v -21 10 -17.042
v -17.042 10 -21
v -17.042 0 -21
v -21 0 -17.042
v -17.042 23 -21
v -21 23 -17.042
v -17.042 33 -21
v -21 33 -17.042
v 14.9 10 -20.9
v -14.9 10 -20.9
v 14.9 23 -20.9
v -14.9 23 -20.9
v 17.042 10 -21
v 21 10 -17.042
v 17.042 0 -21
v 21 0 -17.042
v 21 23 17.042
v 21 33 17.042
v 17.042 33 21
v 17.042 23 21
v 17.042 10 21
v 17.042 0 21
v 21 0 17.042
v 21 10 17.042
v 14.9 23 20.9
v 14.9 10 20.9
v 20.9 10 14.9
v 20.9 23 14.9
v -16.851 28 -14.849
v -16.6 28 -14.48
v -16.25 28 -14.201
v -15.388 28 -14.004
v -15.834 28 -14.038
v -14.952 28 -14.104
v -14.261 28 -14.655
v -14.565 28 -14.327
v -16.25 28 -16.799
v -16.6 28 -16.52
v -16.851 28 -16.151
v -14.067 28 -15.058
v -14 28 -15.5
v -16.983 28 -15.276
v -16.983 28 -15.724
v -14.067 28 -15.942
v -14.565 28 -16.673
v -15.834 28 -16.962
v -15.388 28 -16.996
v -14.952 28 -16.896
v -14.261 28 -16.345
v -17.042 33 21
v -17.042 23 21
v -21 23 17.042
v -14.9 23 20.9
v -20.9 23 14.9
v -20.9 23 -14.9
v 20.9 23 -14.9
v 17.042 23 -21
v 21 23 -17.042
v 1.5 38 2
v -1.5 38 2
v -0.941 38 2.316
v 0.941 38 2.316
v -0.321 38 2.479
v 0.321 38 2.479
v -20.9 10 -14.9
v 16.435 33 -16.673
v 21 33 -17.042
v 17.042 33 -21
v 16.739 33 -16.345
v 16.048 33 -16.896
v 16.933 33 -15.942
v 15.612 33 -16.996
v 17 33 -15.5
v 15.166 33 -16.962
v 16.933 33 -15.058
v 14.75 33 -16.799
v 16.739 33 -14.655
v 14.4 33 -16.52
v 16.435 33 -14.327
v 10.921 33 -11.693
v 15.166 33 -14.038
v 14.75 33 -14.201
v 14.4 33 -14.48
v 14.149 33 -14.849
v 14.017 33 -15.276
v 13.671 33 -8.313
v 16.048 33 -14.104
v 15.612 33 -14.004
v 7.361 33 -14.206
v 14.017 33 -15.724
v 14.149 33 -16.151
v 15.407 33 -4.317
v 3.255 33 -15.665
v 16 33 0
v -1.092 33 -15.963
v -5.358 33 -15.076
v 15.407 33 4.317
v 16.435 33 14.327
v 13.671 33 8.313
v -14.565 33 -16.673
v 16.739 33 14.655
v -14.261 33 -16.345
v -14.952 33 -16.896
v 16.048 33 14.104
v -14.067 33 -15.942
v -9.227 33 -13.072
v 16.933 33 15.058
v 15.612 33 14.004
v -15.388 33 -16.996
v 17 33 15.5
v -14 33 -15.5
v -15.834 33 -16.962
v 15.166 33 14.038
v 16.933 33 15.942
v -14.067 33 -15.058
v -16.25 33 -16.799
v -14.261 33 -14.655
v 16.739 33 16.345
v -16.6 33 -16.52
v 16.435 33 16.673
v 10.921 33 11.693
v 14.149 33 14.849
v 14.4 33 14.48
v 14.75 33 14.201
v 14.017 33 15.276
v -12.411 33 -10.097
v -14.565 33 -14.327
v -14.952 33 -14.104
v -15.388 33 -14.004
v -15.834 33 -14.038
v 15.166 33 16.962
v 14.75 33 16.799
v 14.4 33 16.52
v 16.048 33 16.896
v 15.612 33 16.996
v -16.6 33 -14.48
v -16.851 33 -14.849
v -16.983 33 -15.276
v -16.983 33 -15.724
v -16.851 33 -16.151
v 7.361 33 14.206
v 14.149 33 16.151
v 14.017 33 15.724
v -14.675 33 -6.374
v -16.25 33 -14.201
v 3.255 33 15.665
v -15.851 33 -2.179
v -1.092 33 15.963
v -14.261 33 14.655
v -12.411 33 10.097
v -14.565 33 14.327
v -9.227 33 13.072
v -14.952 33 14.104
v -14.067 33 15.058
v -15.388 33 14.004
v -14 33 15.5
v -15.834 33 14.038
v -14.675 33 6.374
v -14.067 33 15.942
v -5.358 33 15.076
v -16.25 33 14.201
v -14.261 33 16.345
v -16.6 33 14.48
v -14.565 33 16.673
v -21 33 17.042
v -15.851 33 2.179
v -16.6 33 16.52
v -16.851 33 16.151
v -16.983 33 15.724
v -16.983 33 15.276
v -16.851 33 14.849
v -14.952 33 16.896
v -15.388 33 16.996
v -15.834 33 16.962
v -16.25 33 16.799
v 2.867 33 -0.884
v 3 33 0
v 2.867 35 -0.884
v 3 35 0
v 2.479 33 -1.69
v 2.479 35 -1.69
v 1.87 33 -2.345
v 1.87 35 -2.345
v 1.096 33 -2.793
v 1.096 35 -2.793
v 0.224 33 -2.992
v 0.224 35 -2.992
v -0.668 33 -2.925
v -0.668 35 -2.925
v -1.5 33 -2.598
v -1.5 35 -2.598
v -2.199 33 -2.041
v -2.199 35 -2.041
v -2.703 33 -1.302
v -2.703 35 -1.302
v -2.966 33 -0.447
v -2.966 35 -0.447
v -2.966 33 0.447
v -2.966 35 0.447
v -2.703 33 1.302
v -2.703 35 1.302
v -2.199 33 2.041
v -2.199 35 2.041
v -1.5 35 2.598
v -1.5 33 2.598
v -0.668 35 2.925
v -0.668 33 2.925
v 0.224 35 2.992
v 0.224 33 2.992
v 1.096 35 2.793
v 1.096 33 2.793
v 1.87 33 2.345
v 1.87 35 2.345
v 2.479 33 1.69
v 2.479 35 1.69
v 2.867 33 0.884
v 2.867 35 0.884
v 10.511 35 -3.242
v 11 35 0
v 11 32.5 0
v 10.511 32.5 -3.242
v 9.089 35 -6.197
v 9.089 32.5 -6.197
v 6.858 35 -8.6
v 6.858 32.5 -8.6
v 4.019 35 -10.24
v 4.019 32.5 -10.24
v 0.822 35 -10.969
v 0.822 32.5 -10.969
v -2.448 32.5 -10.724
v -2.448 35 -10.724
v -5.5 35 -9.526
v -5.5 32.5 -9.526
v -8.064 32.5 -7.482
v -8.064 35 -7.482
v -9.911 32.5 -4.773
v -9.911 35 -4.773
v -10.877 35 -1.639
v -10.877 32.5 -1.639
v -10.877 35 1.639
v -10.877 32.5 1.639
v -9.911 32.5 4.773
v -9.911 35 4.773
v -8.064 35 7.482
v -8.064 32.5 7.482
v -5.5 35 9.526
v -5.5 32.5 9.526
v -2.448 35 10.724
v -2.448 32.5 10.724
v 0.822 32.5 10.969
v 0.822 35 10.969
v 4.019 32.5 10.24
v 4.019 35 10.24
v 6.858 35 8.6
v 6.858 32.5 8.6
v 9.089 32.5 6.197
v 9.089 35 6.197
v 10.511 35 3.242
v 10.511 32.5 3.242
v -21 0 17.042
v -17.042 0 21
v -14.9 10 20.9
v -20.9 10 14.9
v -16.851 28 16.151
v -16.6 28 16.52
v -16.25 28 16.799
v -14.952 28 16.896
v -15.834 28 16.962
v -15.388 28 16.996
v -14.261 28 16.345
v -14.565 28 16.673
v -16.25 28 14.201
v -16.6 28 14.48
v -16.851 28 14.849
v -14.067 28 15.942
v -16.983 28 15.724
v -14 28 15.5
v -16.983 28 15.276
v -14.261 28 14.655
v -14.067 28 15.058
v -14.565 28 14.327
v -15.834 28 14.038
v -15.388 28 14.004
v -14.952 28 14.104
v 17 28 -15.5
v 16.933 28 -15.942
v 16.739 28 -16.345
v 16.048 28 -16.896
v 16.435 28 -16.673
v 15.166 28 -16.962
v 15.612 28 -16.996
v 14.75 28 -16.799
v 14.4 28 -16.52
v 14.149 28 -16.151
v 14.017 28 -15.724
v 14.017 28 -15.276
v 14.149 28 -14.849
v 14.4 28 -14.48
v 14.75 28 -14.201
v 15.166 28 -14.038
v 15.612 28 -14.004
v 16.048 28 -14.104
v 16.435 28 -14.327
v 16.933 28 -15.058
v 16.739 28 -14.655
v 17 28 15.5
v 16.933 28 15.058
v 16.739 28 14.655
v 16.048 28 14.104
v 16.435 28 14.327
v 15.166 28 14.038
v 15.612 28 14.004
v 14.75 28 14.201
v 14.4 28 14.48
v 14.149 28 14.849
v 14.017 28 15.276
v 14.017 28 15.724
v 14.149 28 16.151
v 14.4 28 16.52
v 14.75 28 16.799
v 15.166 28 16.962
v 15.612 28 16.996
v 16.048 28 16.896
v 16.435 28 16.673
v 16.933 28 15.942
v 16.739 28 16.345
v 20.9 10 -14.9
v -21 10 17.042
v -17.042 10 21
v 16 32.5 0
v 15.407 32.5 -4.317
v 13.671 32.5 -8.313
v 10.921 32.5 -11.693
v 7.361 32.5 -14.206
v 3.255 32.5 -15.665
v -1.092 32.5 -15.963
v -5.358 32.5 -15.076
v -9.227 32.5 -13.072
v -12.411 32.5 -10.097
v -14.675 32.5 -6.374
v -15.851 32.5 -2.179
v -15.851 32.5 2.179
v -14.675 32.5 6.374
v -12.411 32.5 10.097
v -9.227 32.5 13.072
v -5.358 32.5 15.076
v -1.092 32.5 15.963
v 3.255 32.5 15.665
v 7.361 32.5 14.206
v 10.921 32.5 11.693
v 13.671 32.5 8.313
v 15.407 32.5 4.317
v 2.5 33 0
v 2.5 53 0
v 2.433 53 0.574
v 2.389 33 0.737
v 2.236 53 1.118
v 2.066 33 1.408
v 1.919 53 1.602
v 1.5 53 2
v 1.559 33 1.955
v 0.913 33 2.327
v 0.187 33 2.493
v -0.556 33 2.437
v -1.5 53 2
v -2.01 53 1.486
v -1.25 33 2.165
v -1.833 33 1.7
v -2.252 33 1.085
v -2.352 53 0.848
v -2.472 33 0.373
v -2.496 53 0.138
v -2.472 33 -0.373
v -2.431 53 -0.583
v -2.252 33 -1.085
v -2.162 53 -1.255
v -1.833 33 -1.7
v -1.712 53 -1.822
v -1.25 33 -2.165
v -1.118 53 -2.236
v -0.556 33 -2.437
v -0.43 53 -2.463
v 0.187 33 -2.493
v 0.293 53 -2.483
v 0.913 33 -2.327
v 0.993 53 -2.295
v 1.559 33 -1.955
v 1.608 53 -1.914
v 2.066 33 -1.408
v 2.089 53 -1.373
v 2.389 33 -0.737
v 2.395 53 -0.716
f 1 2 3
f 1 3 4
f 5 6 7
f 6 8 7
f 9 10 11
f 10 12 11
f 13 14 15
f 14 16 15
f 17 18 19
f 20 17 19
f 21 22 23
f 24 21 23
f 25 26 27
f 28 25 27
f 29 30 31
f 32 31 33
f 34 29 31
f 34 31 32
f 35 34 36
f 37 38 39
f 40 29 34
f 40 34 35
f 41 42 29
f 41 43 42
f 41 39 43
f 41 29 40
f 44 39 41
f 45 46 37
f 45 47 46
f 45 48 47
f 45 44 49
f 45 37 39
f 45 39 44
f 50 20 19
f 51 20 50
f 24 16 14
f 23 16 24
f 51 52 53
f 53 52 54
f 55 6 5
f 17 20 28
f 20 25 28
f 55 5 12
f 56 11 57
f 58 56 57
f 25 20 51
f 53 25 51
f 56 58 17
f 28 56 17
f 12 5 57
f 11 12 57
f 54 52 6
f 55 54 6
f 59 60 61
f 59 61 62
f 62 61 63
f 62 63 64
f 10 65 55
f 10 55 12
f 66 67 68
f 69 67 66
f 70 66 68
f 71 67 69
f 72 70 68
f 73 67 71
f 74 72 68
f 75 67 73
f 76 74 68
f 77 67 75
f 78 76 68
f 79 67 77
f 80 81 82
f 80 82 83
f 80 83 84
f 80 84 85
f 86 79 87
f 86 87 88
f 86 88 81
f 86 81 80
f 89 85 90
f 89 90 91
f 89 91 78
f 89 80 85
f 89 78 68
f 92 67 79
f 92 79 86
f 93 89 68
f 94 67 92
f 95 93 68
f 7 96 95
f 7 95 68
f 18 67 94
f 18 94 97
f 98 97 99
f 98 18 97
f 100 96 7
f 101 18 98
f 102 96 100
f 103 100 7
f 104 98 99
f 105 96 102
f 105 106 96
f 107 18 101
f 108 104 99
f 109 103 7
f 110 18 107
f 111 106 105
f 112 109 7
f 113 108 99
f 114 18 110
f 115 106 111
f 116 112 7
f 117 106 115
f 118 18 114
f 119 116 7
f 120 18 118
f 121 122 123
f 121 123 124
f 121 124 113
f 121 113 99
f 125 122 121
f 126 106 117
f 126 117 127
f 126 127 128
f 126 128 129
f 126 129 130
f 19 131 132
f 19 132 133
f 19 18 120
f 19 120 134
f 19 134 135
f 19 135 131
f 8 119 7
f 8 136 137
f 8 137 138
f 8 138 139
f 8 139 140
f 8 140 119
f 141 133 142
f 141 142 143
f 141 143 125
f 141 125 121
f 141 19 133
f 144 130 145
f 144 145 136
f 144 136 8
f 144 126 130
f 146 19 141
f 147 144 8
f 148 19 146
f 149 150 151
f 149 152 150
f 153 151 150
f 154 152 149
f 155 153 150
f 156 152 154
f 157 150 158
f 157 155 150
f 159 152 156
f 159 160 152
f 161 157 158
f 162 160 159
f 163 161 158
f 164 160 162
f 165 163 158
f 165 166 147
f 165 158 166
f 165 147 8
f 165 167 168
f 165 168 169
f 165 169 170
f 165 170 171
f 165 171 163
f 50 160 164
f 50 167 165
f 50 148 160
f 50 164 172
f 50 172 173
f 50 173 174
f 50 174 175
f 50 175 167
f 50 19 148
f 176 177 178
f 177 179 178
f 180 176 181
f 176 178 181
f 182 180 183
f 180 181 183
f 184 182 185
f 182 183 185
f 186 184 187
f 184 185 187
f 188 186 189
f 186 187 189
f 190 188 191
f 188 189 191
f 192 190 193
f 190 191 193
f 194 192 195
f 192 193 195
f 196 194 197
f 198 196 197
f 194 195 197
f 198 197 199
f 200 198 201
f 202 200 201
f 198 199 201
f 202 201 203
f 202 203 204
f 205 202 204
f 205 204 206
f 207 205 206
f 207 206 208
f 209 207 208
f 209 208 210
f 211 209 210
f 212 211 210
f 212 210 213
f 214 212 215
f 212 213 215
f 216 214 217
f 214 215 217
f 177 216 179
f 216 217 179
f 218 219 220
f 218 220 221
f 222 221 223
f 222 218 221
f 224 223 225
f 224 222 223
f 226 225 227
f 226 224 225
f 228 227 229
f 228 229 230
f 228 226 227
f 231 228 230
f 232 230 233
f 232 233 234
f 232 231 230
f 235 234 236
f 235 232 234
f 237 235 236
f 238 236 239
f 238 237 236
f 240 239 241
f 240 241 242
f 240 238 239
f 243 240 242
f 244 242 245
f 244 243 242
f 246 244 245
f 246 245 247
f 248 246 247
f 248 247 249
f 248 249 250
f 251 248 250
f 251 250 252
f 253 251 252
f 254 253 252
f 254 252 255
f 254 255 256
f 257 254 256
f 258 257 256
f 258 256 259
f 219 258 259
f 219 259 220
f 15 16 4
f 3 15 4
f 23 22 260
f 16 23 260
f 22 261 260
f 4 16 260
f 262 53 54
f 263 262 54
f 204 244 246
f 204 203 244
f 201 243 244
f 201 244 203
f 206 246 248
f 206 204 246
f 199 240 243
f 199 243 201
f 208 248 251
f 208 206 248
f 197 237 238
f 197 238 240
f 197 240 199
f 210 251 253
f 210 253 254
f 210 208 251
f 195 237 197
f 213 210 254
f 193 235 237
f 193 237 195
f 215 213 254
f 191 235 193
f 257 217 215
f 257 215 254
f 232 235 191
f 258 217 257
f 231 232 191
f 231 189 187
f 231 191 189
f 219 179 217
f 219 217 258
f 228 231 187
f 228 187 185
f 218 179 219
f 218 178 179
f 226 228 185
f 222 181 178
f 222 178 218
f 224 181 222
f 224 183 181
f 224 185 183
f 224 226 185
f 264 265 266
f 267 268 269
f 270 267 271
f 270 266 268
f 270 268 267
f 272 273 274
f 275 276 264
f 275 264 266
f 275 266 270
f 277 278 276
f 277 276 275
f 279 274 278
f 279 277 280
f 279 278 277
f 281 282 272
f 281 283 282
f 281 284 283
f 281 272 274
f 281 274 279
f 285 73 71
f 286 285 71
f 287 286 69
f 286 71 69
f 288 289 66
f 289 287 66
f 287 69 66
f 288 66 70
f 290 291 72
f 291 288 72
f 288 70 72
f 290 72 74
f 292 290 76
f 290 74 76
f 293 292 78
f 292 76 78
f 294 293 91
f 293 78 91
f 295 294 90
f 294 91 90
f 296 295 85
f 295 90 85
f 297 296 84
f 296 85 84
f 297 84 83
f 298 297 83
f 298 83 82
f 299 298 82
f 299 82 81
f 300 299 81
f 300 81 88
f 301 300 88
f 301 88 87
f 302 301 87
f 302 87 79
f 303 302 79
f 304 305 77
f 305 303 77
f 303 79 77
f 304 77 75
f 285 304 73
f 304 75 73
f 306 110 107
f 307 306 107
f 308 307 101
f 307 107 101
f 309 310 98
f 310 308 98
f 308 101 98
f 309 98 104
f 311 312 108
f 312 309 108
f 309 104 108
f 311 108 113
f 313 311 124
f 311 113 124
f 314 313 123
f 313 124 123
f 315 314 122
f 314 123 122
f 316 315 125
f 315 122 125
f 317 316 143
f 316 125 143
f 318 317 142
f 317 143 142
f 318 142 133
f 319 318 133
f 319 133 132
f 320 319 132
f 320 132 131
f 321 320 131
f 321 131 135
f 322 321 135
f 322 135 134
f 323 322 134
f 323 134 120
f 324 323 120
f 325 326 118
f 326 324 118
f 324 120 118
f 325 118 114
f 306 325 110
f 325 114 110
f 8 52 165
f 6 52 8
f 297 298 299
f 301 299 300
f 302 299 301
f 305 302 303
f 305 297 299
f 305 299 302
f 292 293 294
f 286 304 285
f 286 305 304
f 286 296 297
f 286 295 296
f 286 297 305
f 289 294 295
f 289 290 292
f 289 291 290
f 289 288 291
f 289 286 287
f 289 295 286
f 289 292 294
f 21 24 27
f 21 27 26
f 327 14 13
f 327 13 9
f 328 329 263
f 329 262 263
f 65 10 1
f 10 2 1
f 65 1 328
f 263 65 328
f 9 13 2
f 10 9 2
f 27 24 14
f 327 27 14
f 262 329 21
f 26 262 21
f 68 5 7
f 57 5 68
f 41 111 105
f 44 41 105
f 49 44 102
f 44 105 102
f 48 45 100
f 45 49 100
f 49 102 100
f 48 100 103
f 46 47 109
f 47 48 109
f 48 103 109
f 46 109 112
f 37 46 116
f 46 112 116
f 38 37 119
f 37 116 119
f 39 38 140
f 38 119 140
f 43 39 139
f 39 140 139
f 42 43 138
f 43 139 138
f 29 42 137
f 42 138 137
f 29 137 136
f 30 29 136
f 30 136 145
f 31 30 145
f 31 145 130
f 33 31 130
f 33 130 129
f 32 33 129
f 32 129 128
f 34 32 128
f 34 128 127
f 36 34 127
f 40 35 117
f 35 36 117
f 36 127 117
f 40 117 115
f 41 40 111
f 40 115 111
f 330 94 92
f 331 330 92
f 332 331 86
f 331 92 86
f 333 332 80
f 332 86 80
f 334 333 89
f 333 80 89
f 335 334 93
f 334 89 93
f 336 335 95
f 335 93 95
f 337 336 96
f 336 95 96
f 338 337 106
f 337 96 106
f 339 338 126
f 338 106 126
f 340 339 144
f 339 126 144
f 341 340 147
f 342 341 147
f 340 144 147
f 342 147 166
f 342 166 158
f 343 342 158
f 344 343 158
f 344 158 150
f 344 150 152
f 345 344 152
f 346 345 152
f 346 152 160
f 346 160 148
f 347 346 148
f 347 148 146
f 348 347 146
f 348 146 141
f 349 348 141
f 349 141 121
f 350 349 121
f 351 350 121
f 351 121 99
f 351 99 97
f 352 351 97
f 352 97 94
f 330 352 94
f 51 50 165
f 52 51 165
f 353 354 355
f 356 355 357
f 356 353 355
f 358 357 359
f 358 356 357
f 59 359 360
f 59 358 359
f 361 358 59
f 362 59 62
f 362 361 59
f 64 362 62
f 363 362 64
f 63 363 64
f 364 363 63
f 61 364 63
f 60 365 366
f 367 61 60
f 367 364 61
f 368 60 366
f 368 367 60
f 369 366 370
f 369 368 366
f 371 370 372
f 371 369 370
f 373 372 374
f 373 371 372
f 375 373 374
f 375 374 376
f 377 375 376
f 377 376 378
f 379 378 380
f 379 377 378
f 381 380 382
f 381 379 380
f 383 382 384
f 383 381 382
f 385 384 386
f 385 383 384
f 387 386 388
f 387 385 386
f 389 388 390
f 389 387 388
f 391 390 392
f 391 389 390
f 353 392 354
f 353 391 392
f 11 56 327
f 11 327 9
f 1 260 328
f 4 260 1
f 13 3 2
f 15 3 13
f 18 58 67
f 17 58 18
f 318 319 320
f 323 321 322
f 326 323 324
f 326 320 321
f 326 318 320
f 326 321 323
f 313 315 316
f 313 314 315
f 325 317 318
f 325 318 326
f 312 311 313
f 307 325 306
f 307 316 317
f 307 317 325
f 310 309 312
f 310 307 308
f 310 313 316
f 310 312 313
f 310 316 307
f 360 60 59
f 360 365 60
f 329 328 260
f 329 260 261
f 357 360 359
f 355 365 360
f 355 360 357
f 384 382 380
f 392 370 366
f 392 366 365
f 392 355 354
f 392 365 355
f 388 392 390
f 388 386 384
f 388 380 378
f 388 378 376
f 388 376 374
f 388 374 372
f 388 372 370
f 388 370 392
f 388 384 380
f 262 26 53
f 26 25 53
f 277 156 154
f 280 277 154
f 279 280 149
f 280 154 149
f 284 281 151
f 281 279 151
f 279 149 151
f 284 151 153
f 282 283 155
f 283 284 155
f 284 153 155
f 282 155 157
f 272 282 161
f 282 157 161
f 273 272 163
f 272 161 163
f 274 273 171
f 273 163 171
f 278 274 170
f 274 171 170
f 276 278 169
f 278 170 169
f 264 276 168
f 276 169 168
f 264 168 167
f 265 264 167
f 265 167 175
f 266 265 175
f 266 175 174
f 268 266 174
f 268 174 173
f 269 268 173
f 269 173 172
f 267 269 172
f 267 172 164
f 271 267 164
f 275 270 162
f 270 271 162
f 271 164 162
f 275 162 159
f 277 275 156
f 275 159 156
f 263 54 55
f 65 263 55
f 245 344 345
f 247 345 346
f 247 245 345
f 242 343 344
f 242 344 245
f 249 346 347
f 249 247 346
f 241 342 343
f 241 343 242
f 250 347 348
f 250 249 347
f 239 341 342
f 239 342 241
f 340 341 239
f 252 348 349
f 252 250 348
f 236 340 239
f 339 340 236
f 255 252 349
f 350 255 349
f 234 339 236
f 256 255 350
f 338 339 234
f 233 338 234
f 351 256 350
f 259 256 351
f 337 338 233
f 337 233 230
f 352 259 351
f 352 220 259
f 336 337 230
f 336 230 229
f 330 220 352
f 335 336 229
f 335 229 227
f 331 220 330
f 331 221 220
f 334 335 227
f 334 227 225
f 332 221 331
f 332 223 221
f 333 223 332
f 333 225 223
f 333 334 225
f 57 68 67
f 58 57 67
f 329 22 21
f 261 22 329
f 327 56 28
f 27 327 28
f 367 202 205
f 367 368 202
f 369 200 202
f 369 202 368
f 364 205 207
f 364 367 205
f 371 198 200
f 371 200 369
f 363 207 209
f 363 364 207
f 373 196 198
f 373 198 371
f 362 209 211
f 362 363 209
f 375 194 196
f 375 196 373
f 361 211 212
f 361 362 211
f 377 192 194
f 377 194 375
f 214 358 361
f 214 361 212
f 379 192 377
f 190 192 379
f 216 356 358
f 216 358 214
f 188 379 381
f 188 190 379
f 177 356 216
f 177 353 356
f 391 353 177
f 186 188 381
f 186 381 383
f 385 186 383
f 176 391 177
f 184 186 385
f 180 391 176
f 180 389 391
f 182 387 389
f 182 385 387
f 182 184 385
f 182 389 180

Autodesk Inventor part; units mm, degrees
ref_plane "YZ Plane" through (0, 0, 0) normal (1, 0, 0) x (0, 1, 0)
ref_plane "XZ Plane" through (0, 0, 0) normal (0, 1, 0) x (-1, 0, 0)
sketch "Sketch1" plane through (0, 0, 0) normal (0, 1, 0) x (-1, 0, 0)
  line L0 (-21, 21) -> (21, 21)
  line L1 (21, 21) -> (21, -21)
  line L2 (21, -21) -> (-21, -21)
  line L3 (-21, -21) -> (-21, 21)
  line L4 (-21, 21) -> (21, -21) construction
  line L5 (21, 21) -> (-21, -21) construction
  point P0 (0, 0)
  dimension "d0" = 42
  dimension "d1" = 42
extrude "Extrusion1" add sketch "Sketch1" along normal blind 33
ref_plane "Work Plane1" through (0, 16.5, 0) normal (0, 1, 0) x (1, 0, 0)
sketch "Sketch2" plane through (0, 33, 0) normal (0, 1, 0) x (1, 0, 0)
  line L0 (0, -38.0423) -> (-38.0423, 0)
  line L1 (-38.0423, 0) -> (0, 38.0423)
  line L2 (0, 38.0423) -> (38.0423, 0)
  line L3 (38.0423, 0) -> (0, -38.0423)
  line L4 (0, -38.0423) -> (0, 38.0423) construction
  line L5 (-38.0423, 0) -> (38.0423, 0) construction
  line L6 (-21, 21) -> (-21, -21) projected
  circle A0 centre (0, 0) radius 250
  dimension "d4" = 53.8
  dimension "d5" = 53.8
  dimension "d6" = 500
extrude "Extrusion2" cut sketch "Sketch2" against normal blind 10
sketch "Sketch3" plane through (0, 16.5, 0) normal (0, 1, 0) x (1, 0, 0)
  line L0 (-20.9, -20.9) -> (20.9, -20.9)
  line L1 (20.9, -20.9) -> (20.9, 20.9)
  line L2 (20.9, 20.9) -> (-20.9, 20.9)
  line L3 (-20.9, 20.9) -> (-20.9, -20.9)
  line L4 (-21, -21) -> (-21, -17.0423) projected
  line L5 (21, -21) -> (17.0423, -21) projected
  line L6 (21, 21) -> (21, 17.0423) projected
  line L7 (-21, 21) -> (-17.0423, 21) projected
  circle A0 centre (0, 0) radius 200
  dimension "d9" = 0.1
  dimension "d10" = 0.1
  dimension "d11" = 0.1
  dimension "d12" = 0.1
  dimension "d13" = 400
extrude "Extrusion3" cut sketch "Sketch3" along normal up to surface (6.5 mm away)
chamfer "Chamfer1" distance 6 angle 45 4 edges at (20.9, 19.75, 20.9) (20.9, 19.75, -20.9) (-20.9, 19.75, 20.9) (-20.9, 19.75, -20.9)
mirror "Mirror1" about plane through (0, 16.5, 0) normal (0, 1, 0) of "Extrusion3", "Extrusion2", "Chamfer1"
sketch "Sketch4" plane through (0, 33, 0) normal (0, 1, 0) x (1, 0, 0)
  circle A0 centre (0, 0) radius 11
  dimension "d19" = 22
extrude "Extrusion4" add sketch "Sketch4" along normal blind 2
sketch "Sketch5" plane through (0, 33, 0) normal (0, 1, 0) x (1, 0, 0)
  circle A0 centre (0, 0) radius 11 projected
  line L0 (17.0423, -21) -> (21, -17.0423) projected
  line L1 (21, -17.0423) -> (21, 17.0423) projected
  line L2 (21, 17.0423) -> (17.0423, 21) projected
  line L3 (17.0423, 21) -> (-17.0423, 21) projected
  line L4 (-17.0423, 21) -> (-21, 17.0423) projected
  line L5 (-21, 17.0423) -> (-21, -17.0423) projected
  line L6 (-21, -17.0423) -> (-17.0423, -21) projected
  line L7 (-17.0423, -21) -> (17.0423, -21) projected
  circle A1 centre (0, 0) radius 16
  dimension "d22" = 32
extrude "Extrusion5" cut sketch "Sketch5" against normal blind 0.5 contours A1
sketch "Sketch6" plane through (0, 35, 0) normal (0, 1, 0) x (1, 0, 0)
  circle A0 centre (0, 0) radius 3
  dimension "d25" = 6
extrude "Extrusion6" cut sketch "Sketch6" against normal blind 2
sketch "Sketch8" plane through (0, 33, 0) normal (0, 1, 0) x (1, 0, 0)
  circle A0 centre (0, 0) radius 16 construction
  line L0 (17.0423, -21) -> (21, -17.0423) construction
  line L1 (21, -17.0423) -> (21, 17.0423) construction
  line L2 (21, 17.0423) -> (17.0423, 21) construction
  line L3 (17.0423, 21) -> (-17.0423, 21) construction
  line L4 (-17.0423, 21) -> (-21, 17.0423) construction
  line L5 (-21, 17.0423) -> (-21, -17.0423) construction
  line L6 (-21, -17.0423) -> (-17.0423, -21) construction
  line L7 (-17.0423, -21) -> (17.0423, -21) construction
  line L8 (-15.5, -15.5) -> (15.5, -15.5) construction
  line L9 (15.5, -15.5) -> (15.5, 15.5) construction
  line L10 (15.5, 15.5) -> (-15.5, 15.5) construction
  line L11 (-15.5, 15.5) -> (-15.5, -15.5) construction
  line L12 (-15.5, -15.5) -> (15.5, 15.5) construction
  line L13 (15.5, -15.5) -> (-15.5, 15.5) construction
  circle A1 centre (-15.5, 15.5) radius 1.5
  circle A2 centre (15.5, 15.5) radius 1.5
  circle A3 centre (15.5, -15.5) radius 1.5
  circle A4 centre (-15.5, -15.5) radius 1.5
  dimension "d36" = 31
  dimension "d37" = 31
  dimension "d38" = 3
  dimension "d39" = 3
  dimension "d40" = 3
  dimension "d41" = 3
extrude "Extrusion8" cut sketch "Sketch8" against normal blind 5
thread "Thread2" size "M3x0.5" class "6H" standard "ANSI Metric M Profile" full length
sketch "Sketch9" plane through (0, 33, 0) normal (0, 1, 0) x (1, 0, 0)
  circle A0 centre (0, 0) radius 2.5
  dimension "d49" = 5
extrude "Extrusion9" add sketch "Sketch9" along normal blind 20
pattern_circular "Circular Pattern2" count 4 over 360 about axis through (0, 33, 0) along (0, 1, 0) of "Extrusion8"
sketch "Sketch10" plane through (0, 53, 0) normal (0, 1, 0) x (1, 0, 0)
  circle A0 centre (0, 0) radius 2.5 projected
  circle A1 centre (0, 0) radius 2.5 projected
  line L0 (-1.5, -2) -> (1.5, -2)
  line L1 (1.5, -2) -> (1.5, -2.5)
  line L2 (1.5, -2.5) -> (-1.5, -2.5)
  line L3 (-1.5, -2.5) -> (-1.5, -2)
  circle A2 centre (0, 0) radius 2.5 projected
  dimension "d55" = 0.5
extrude "Extrusion10" cut sketch "Sketch10" against normal blind 15 contours L0 A0 | A0 L2 L3 | L1 L2 A0 picked at (0.3466, -2.0912)
equation "\"d9\" = d10"
equation "\"d11\" = d10"
equation "\"d12\" = d10"
properties part number "nema17_33mm"
